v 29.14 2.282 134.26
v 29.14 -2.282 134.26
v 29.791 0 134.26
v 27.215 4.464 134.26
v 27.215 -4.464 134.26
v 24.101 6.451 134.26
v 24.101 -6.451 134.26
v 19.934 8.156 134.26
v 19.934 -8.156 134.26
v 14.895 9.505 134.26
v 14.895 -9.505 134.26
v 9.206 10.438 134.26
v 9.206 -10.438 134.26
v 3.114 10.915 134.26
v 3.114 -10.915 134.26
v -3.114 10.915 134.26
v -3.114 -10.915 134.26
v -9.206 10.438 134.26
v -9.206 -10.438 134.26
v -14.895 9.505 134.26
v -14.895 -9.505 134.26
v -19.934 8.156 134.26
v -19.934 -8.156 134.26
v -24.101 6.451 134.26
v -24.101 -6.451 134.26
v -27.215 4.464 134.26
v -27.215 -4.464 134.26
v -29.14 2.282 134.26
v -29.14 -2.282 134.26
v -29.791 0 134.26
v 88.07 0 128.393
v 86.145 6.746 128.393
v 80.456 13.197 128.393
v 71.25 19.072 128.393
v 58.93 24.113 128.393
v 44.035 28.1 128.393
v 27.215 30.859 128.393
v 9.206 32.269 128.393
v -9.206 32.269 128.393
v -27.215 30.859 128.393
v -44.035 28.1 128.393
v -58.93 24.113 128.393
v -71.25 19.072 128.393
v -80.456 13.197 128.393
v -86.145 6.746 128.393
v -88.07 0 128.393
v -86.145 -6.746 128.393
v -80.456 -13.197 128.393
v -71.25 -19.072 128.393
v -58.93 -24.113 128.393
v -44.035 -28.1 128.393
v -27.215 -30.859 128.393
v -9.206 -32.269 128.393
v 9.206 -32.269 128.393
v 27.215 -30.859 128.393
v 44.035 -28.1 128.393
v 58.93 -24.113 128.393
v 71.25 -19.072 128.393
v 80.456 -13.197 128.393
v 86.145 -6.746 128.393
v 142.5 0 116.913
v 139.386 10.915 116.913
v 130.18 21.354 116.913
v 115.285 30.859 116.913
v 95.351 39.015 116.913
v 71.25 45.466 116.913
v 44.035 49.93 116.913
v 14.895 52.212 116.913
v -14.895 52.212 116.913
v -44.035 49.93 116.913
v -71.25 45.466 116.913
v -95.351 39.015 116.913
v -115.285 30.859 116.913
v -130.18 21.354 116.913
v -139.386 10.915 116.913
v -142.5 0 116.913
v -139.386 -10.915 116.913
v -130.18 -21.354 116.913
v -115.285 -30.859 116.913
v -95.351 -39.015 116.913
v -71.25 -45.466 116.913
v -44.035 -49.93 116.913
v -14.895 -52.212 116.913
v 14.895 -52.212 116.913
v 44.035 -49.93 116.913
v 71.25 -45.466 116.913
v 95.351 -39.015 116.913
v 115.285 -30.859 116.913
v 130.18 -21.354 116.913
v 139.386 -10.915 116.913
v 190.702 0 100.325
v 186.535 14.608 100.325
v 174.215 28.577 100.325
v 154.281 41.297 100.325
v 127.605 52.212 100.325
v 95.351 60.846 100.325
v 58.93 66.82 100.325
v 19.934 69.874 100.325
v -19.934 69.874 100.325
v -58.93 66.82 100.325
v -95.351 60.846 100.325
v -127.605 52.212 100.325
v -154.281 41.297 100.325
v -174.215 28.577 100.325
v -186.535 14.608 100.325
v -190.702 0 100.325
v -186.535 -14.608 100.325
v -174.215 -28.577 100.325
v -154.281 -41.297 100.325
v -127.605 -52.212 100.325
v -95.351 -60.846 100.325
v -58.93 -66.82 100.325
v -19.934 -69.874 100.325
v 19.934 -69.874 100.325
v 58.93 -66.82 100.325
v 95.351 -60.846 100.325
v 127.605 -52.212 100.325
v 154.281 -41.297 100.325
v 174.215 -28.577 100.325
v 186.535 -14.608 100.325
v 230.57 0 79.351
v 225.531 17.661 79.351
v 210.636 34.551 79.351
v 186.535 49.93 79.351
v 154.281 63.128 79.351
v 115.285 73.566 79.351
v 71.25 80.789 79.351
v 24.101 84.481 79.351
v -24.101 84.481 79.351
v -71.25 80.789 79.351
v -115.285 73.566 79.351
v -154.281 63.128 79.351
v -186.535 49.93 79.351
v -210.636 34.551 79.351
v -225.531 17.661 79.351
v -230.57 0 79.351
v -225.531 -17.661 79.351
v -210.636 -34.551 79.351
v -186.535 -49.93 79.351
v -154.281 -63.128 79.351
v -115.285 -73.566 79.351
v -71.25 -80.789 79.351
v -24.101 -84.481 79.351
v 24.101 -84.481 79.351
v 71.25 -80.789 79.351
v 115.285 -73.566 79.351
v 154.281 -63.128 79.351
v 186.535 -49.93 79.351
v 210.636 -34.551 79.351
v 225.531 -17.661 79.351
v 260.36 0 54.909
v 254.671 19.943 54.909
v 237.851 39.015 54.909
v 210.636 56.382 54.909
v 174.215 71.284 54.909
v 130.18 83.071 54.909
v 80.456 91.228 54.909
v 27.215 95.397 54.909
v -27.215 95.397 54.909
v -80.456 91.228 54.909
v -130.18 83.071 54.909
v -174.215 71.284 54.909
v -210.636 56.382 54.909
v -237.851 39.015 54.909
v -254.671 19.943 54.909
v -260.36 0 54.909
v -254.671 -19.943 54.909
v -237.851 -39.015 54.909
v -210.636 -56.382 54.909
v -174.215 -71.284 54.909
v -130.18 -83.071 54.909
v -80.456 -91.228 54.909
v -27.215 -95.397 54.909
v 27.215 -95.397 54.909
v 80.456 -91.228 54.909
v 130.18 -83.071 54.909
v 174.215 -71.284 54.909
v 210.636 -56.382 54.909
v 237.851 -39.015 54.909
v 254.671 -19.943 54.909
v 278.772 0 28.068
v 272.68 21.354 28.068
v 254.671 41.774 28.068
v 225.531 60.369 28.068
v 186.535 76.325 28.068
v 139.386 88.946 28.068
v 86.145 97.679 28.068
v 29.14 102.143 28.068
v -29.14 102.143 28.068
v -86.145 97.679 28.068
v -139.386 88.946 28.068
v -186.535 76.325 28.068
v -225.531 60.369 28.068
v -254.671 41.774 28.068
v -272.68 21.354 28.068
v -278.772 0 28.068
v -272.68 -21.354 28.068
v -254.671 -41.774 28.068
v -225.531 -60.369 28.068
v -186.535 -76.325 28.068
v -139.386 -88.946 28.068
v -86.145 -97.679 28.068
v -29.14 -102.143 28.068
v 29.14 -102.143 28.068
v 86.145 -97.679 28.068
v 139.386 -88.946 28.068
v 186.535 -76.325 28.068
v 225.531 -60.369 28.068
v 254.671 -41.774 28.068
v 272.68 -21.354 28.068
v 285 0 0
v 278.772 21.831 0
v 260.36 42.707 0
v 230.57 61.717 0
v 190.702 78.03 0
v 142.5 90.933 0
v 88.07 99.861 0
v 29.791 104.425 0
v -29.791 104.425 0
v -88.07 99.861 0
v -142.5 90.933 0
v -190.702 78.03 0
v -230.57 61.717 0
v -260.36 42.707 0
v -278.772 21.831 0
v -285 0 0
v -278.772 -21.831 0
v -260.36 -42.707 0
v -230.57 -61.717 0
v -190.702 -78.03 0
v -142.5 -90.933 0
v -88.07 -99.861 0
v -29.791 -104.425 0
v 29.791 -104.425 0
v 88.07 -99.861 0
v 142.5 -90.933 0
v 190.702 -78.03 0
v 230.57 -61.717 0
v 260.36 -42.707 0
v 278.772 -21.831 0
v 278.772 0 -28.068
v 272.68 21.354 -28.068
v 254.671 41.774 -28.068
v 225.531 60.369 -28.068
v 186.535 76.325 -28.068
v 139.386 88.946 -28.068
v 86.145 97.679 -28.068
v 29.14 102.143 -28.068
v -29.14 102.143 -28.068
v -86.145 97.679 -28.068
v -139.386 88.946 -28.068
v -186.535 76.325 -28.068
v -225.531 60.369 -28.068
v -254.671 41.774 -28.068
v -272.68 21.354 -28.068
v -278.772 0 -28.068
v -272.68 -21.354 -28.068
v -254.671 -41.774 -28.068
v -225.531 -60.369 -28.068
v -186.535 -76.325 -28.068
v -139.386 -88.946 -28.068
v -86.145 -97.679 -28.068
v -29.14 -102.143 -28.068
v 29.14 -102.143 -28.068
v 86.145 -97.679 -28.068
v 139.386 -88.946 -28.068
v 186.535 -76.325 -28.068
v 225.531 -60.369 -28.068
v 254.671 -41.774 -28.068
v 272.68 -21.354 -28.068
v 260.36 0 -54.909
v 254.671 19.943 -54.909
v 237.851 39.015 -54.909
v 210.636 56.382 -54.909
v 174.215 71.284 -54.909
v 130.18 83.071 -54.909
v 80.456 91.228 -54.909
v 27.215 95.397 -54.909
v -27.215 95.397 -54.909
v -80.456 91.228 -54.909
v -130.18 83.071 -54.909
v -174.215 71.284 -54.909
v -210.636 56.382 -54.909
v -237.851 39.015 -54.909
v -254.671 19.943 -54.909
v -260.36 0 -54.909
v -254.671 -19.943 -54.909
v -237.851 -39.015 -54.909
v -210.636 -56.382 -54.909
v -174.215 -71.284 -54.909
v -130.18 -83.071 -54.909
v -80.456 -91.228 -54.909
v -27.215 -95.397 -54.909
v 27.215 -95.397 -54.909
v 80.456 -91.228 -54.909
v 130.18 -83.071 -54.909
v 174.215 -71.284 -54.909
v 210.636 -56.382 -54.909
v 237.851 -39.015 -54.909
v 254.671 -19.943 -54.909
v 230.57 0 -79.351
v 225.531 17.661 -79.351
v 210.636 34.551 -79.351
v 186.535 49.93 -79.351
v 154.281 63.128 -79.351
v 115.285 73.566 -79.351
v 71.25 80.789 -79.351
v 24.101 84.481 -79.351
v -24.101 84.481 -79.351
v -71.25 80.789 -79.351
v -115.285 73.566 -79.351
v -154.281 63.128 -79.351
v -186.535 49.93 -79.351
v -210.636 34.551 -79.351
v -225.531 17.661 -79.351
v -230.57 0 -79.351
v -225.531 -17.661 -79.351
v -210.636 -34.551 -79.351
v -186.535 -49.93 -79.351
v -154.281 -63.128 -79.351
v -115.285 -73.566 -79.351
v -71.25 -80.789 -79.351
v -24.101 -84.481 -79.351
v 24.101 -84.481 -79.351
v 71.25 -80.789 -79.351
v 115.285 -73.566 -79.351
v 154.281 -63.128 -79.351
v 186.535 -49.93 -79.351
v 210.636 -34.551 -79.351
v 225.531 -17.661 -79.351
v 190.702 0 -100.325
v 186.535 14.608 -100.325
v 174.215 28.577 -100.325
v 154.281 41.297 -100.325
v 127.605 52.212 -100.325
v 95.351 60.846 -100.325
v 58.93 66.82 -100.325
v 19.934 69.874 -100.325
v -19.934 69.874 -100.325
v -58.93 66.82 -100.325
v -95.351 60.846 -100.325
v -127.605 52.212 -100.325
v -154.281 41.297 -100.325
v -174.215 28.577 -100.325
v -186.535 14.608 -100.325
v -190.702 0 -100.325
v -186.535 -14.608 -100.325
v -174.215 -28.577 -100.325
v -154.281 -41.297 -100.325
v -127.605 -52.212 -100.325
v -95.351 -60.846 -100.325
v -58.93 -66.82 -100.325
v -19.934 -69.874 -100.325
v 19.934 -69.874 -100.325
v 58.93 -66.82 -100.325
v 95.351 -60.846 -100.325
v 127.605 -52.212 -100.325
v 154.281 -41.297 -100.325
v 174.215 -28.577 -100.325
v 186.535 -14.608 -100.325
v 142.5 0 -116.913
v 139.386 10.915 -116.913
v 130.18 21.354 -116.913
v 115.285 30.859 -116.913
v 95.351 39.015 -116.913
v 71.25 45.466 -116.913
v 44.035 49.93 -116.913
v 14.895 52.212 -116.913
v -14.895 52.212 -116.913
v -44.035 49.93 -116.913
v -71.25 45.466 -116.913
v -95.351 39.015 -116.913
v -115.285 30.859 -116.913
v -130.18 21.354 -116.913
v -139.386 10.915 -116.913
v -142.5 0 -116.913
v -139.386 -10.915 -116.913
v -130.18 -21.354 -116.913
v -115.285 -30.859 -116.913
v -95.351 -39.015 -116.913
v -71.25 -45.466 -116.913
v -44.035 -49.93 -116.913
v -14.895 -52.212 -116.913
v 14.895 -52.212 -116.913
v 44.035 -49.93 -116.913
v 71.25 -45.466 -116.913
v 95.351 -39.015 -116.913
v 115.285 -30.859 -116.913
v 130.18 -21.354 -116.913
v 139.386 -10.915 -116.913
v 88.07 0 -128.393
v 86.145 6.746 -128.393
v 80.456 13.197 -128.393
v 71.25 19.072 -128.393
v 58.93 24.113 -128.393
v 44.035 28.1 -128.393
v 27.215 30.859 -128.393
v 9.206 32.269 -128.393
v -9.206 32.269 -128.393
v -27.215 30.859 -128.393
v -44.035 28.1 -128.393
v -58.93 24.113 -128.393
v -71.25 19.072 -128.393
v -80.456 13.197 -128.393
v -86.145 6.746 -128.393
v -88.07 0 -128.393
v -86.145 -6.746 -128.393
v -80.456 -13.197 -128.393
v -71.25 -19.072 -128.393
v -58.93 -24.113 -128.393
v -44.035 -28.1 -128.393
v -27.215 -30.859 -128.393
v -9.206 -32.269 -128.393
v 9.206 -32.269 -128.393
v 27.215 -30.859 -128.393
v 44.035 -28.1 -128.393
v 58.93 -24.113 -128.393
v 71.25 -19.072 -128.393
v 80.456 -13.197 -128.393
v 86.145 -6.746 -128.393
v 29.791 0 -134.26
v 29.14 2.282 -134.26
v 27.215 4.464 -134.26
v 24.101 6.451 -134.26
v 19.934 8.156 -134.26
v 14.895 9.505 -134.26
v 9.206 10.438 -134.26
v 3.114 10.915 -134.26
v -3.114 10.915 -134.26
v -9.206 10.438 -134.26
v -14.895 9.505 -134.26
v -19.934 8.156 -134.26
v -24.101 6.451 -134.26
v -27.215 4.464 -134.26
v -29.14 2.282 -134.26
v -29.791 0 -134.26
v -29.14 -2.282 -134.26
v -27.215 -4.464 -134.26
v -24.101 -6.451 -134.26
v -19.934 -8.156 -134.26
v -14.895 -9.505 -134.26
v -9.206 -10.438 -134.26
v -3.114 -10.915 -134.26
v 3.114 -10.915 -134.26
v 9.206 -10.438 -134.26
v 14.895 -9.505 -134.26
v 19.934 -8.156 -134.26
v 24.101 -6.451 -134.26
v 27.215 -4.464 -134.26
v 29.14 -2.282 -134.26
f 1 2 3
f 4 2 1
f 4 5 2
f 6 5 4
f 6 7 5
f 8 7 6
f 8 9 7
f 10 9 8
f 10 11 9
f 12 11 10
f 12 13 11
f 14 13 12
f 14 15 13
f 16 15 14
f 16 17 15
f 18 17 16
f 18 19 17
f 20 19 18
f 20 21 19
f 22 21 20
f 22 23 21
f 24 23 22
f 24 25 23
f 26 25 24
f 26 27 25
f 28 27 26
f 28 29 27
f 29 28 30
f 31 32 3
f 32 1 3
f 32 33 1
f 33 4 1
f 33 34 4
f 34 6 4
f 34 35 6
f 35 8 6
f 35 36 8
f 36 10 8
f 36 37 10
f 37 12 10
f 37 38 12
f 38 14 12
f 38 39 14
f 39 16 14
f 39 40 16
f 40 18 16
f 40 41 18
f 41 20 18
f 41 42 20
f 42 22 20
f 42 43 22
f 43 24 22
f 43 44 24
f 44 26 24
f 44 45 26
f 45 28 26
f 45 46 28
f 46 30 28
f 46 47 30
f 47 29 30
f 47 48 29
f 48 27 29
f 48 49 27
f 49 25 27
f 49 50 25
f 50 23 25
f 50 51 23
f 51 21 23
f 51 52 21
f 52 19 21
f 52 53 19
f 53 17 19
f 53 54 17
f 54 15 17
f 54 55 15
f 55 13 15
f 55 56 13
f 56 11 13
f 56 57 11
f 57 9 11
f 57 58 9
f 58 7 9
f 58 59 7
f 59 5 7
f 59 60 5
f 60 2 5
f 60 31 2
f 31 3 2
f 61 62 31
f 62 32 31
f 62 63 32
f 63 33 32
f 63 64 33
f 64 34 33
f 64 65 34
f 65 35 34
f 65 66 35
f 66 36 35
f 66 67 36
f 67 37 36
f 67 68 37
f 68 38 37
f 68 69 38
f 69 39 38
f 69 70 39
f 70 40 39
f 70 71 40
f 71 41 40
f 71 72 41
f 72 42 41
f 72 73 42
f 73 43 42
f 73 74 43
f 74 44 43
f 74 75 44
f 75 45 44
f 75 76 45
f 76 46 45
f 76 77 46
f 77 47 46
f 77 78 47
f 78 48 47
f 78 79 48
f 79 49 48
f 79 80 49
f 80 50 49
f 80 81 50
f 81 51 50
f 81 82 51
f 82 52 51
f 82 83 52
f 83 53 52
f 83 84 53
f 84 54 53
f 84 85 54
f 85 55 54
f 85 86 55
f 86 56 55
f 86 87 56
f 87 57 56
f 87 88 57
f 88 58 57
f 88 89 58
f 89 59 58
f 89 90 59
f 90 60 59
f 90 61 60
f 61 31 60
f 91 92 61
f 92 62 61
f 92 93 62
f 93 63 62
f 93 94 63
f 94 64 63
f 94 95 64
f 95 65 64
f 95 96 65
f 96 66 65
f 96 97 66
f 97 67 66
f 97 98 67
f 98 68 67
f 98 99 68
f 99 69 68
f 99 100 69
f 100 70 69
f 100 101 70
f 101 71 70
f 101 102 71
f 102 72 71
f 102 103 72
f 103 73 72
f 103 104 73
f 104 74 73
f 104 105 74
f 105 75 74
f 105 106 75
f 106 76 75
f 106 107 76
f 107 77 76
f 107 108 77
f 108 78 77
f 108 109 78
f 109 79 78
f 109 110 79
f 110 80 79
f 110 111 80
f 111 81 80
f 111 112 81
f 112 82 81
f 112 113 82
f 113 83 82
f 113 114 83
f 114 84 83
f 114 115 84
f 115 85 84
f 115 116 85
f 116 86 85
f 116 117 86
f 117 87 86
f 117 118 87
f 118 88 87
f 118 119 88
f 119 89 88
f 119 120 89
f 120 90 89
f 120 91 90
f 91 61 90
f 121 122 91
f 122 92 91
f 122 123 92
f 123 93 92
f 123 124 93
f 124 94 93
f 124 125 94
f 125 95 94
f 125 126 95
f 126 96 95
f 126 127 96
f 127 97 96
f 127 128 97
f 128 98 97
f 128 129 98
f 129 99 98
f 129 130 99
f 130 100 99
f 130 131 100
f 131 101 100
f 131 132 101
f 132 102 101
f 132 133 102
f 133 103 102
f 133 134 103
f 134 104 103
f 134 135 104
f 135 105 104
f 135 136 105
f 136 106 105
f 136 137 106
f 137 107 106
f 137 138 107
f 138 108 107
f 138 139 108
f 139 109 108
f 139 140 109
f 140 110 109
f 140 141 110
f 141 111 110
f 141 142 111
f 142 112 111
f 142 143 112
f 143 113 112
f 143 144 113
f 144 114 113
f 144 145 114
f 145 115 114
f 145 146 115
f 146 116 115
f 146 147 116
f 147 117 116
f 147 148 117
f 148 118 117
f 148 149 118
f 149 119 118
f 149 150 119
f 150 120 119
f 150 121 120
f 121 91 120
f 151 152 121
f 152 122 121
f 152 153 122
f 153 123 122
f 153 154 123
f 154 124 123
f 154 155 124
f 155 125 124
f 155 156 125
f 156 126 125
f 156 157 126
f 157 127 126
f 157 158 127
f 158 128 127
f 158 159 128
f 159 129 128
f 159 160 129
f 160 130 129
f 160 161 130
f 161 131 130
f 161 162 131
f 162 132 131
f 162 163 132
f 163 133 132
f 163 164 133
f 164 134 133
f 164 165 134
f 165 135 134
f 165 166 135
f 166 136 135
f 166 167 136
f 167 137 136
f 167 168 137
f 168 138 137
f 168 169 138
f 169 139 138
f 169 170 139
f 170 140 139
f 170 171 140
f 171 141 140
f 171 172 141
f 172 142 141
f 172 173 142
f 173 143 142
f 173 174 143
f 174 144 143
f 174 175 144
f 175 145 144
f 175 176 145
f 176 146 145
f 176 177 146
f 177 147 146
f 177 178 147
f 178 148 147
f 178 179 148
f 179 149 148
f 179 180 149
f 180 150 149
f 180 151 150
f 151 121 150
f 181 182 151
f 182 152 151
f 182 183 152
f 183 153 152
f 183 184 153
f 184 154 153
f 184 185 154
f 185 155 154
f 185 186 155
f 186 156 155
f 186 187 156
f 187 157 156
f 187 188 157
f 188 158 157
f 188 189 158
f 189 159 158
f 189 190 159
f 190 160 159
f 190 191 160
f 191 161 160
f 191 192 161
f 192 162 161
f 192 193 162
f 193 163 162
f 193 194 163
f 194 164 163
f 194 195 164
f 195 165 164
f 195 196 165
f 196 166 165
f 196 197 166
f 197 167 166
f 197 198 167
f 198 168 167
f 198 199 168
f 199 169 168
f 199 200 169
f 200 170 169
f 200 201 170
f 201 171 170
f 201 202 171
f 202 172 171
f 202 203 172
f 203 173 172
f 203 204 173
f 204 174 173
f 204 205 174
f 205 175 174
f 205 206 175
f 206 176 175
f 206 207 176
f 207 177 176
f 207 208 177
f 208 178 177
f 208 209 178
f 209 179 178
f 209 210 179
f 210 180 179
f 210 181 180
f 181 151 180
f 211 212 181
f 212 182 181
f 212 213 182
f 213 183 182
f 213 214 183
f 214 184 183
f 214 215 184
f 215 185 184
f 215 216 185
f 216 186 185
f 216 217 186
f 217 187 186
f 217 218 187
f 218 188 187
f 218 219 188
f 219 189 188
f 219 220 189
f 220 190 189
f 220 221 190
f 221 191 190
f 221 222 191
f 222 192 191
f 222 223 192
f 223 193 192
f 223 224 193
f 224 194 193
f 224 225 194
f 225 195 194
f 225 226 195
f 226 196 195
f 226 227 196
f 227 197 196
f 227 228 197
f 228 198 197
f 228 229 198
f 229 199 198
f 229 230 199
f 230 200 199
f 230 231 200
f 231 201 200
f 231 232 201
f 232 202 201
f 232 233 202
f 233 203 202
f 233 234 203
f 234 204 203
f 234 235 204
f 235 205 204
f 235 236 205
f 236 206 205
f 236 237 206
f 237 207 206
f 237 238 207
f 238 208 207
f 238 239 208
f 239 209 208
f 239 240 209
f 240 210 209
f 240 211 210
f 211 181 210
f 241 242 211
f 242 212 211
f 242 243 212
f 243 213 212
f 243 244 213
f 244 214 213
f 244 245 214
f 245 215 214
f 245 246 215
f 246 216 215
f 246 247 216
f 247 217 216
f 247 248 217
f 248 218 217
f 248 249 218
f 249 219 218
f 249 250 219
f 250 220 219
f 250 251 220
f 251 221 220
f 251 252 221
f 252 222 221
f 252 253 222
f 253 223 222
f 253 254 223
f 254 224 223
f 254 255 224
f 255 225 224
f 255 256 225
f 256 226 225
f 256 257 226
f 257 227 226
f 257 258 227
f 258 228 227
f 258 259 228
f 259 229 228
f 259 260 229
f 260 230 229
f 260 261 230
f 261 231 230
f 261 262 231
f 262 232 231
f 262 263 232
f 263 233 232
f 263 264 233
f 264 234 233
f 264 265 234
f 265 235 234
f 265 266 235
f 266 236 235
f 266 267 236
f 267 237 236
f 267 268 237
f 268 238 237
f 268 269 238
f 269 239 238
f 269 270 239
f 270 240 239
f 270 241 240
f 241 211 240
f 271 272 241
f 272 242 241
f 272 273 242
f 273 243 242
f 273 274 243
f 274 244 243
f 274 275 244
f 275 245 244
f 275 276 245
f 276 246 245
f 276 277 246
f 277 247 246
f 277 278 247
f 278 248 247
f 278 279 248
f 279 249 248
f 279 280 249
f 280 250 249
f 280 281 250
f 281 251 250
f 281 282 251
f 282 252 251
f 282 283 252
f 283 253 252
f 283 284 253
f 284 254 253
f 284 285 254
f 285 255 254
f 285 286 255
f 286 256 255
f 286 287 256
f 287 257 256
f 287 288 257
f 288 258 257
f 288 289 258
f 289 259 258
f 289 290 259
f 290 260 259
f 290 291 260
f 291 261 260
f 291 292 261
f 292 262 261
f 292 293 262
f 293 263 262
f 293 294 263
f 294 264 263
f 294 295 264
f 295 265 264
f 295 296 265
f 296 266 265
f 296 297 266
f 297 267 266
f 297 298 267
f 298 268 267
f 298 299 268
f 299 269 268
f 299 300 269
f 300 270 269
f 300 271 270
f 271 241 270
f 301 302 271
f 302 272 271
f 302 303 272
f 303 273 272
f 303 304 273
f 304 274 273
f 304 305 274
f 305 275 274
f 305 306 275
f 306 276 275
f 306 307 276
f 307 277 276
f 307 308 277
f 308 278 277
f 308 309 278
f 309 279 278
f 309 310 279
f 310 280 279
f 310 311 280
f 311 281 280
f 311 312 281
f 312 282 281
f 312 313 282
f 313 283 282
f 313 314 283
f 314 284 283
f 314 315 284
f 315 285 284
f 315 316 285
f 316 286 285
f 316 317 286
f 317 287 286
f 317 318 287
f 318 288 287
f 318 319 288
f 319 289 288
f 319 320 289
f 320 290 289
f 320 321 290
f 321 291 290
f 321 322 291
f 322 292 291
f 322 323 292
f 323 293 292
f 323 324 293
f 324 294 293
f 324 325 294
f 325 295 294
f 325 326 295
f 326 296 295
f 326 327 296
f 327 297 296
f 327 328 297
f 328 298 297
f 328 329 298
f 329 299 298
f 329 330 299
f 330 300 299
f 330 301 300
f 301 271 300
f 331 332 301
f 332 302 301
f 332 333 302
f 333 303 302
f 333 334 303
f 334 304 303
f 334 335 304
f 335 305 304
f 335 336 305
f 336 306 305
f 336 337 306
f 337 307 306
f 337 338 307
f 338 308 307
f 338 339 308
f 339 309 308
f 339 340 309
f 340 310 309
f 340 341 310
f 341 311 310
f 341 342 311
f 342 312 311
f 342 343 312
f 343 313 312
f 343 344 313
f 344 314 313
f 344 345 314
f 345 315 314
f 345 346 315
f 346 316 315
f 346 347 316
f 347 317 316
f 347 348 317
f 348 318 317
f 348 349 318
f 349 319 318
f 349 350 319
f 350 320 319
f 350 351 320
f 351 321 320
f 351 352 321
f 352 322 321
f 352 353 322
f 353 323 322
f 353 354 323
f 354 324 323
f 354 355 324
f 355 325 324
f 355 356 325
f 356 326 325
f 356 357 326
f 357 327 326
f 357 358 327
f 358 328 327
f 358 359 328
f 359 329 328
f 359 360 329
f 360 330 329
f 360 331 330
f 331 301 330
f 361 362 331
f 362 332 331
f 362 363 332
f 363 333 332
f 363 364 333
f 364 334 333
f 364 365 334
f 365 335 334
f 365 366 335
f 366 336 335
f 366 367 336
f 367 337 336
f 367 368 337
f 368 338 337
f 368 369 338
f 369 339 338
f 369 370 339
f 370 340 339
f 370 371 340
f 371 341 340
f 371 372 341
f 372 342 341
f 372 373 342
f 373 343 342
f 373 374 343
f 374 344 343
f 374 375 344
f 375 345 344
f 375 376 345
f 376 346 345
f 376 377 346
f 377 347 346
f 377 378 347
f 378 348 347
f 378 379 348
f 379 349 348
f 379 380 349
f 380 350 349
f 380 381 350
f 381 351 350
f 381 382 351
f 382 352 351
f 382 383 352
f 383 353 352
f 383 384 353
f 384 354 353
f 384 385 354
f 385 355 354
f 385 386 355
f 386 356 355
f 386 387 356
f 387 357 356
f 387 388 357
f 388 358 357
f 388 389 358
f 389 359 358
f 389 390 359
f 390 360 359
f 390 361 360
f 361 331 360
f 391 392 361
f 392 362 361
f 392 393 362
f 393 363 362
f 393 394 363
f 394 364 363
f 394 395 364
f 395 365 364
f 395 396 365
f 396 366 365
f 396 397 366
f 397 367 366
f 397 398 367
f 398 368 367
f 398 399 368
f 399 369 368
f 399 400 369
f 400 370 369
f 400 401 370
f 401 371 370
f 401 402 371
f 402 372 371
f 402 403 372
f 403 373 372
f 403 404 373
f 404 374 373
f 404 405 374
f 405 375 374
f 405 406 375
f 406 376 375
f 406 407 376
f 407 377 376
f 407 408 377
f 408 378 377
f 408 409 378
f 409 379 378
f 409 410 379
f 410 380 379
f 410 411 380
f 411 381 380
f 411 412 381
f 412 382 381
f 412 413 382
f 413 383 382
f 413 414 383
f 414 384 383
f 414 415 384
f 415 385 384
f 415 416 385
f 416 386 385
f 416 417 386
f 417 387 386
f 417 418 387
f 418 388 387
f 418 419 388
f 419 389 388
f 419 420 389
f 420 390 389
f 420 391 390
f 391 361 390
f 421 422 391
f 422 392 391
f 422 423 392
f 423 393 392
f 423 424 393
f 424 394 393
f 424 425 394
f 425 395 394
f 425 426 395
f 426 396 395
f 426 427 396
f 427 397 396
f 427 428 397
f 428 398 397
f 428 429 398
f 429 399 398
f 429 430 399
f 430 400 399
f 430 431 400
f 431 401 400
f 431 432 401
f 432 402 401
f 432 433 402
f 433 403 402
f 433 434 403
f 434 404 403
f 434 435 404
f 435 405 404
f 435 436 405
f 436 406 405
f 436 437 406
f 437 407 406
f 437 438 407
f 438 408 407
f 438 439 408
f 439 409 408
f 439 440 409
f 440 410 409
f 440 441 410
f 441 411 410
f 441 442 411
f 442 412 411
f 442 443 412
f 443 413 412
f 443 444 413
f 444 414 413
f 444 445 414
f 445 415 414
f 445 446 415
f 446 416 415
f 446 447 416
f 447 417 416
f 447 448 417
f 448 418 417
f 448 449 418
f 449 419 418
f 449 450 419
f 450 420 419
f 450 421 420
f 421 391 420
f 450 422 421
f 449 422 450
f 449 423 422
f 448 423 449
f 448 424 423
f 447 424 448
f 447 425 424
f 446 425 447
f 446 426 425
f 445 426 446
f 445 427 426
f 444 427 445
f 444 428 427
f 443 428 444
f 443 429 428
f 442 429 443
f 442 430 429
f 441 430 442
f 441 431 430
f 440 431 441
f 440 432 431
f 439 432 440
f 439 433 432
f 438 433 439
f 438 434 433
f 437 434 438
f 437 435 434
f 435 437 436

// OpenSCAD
// Generated by SolidPython 1.0.1 on 2020-07-29 00:46:53


scale(v = [19, 7, 9]) {
	sphere(r = 15);
}
/***********************************************
*********      SolidPython code:      **********
************************************************
 
# import packages: SolidPython
from solid import *
from solid.utils import *
from itertools import chain, combinations, permutations


class Resize:

    def __init__(self, scad_file):
        self.scad_file = scad_file
        #self.scad_file = import_scad(scad_file)
        # cone/cylinder param:
        self.r1 = 0
        self.r2 = 0
        self.h = 0
        # rectangular prism param:
        self.w = 0
        self.l = 0
        # ellipse param:
        self.r = 0

    # import OpenScad code (file name corresponds to shape)


    # classify shape + parameters
    def assign(self, param1, param2, param3):
        if self.scad_file == 'cone.scad':
            self.r1 = param1
            self.r2 = param2
            self.h = param3
        elif self.scad_file == 'cylinder.scad':
            self.r1 = param1
            self.r2 = param2
            self.h = param3
        elif self.scad_file == 'rectangularPrism.scad':
            self.h = param1
            self.l = param2
            self.w = param3
        else:
            self.r = param1
            self.h = param2

    # resize parameters
    def iterate(self):
        x = range(3, 20, 2)
        i = 1
        if self.scad_file == 'cone.scad':
            tempList = list(permutations(x, 2))
            for temp in tempList:
                param1 = temp[0]
                param2 = temp[1]
                filepath = 'produced_scad_files/' + 'cone' + str(param1) + '_' + str(param2) + '_' + '.scad'
                scad_render_to_file(cylinder(h=param1, r1=param2, r2=0), filepath)

        elif self.scad_file == 'cylinder.scad':
            tempList = list(permutations(x, 3))
            for temp in tempList:
                param1 = temp[0]
                param2 = temp[1]
                filepath = 'produced_scad_files/' + 'cylinder' + str(param1) + '_' + str(param2) + '_' + '.scad'
                scad_render_to_file(cylinder(h=param1, r1=param2, r2=param2), filepath)

        elif self.scad_file == 'rectangularPrism.scad':
            tempList = list(permutations(x, 3))
            for temp in tempList:
                param1 = temp[0]
                param2 = temp[1]
                param3 = temp[2]
                filepath = 'produced_scad_files/' + 'rectangularPrism' + str(param1) + '_' + str(param2) + '_' + str(
                    param3) + '.scad'
                scad_render_to_file(cube(size=(param1, param2, param3)), filepath)

        elif self.scad_file == 'ellipse.scad':
            tempList = list(permutations(x, 4))
            for temp in tempList:
                param1 = temp[0]
                param2 = temp[1]
                param3 = temp[2]
                param4 = temp[3]
                filepath = 'produced_scad_files/' + 'ellipse' + str(param1) + '_' + str(param2) + '_' + str(param3) + '_' + str(param4) + '.scad'
                scad_render_to_file(scale([param1, param2, param3])(sphere(r=param4)), filepath)

    def render_to_scadfile(self):
        scad_render_to_file(scad, 'example.scad') 
 
************************************************/
